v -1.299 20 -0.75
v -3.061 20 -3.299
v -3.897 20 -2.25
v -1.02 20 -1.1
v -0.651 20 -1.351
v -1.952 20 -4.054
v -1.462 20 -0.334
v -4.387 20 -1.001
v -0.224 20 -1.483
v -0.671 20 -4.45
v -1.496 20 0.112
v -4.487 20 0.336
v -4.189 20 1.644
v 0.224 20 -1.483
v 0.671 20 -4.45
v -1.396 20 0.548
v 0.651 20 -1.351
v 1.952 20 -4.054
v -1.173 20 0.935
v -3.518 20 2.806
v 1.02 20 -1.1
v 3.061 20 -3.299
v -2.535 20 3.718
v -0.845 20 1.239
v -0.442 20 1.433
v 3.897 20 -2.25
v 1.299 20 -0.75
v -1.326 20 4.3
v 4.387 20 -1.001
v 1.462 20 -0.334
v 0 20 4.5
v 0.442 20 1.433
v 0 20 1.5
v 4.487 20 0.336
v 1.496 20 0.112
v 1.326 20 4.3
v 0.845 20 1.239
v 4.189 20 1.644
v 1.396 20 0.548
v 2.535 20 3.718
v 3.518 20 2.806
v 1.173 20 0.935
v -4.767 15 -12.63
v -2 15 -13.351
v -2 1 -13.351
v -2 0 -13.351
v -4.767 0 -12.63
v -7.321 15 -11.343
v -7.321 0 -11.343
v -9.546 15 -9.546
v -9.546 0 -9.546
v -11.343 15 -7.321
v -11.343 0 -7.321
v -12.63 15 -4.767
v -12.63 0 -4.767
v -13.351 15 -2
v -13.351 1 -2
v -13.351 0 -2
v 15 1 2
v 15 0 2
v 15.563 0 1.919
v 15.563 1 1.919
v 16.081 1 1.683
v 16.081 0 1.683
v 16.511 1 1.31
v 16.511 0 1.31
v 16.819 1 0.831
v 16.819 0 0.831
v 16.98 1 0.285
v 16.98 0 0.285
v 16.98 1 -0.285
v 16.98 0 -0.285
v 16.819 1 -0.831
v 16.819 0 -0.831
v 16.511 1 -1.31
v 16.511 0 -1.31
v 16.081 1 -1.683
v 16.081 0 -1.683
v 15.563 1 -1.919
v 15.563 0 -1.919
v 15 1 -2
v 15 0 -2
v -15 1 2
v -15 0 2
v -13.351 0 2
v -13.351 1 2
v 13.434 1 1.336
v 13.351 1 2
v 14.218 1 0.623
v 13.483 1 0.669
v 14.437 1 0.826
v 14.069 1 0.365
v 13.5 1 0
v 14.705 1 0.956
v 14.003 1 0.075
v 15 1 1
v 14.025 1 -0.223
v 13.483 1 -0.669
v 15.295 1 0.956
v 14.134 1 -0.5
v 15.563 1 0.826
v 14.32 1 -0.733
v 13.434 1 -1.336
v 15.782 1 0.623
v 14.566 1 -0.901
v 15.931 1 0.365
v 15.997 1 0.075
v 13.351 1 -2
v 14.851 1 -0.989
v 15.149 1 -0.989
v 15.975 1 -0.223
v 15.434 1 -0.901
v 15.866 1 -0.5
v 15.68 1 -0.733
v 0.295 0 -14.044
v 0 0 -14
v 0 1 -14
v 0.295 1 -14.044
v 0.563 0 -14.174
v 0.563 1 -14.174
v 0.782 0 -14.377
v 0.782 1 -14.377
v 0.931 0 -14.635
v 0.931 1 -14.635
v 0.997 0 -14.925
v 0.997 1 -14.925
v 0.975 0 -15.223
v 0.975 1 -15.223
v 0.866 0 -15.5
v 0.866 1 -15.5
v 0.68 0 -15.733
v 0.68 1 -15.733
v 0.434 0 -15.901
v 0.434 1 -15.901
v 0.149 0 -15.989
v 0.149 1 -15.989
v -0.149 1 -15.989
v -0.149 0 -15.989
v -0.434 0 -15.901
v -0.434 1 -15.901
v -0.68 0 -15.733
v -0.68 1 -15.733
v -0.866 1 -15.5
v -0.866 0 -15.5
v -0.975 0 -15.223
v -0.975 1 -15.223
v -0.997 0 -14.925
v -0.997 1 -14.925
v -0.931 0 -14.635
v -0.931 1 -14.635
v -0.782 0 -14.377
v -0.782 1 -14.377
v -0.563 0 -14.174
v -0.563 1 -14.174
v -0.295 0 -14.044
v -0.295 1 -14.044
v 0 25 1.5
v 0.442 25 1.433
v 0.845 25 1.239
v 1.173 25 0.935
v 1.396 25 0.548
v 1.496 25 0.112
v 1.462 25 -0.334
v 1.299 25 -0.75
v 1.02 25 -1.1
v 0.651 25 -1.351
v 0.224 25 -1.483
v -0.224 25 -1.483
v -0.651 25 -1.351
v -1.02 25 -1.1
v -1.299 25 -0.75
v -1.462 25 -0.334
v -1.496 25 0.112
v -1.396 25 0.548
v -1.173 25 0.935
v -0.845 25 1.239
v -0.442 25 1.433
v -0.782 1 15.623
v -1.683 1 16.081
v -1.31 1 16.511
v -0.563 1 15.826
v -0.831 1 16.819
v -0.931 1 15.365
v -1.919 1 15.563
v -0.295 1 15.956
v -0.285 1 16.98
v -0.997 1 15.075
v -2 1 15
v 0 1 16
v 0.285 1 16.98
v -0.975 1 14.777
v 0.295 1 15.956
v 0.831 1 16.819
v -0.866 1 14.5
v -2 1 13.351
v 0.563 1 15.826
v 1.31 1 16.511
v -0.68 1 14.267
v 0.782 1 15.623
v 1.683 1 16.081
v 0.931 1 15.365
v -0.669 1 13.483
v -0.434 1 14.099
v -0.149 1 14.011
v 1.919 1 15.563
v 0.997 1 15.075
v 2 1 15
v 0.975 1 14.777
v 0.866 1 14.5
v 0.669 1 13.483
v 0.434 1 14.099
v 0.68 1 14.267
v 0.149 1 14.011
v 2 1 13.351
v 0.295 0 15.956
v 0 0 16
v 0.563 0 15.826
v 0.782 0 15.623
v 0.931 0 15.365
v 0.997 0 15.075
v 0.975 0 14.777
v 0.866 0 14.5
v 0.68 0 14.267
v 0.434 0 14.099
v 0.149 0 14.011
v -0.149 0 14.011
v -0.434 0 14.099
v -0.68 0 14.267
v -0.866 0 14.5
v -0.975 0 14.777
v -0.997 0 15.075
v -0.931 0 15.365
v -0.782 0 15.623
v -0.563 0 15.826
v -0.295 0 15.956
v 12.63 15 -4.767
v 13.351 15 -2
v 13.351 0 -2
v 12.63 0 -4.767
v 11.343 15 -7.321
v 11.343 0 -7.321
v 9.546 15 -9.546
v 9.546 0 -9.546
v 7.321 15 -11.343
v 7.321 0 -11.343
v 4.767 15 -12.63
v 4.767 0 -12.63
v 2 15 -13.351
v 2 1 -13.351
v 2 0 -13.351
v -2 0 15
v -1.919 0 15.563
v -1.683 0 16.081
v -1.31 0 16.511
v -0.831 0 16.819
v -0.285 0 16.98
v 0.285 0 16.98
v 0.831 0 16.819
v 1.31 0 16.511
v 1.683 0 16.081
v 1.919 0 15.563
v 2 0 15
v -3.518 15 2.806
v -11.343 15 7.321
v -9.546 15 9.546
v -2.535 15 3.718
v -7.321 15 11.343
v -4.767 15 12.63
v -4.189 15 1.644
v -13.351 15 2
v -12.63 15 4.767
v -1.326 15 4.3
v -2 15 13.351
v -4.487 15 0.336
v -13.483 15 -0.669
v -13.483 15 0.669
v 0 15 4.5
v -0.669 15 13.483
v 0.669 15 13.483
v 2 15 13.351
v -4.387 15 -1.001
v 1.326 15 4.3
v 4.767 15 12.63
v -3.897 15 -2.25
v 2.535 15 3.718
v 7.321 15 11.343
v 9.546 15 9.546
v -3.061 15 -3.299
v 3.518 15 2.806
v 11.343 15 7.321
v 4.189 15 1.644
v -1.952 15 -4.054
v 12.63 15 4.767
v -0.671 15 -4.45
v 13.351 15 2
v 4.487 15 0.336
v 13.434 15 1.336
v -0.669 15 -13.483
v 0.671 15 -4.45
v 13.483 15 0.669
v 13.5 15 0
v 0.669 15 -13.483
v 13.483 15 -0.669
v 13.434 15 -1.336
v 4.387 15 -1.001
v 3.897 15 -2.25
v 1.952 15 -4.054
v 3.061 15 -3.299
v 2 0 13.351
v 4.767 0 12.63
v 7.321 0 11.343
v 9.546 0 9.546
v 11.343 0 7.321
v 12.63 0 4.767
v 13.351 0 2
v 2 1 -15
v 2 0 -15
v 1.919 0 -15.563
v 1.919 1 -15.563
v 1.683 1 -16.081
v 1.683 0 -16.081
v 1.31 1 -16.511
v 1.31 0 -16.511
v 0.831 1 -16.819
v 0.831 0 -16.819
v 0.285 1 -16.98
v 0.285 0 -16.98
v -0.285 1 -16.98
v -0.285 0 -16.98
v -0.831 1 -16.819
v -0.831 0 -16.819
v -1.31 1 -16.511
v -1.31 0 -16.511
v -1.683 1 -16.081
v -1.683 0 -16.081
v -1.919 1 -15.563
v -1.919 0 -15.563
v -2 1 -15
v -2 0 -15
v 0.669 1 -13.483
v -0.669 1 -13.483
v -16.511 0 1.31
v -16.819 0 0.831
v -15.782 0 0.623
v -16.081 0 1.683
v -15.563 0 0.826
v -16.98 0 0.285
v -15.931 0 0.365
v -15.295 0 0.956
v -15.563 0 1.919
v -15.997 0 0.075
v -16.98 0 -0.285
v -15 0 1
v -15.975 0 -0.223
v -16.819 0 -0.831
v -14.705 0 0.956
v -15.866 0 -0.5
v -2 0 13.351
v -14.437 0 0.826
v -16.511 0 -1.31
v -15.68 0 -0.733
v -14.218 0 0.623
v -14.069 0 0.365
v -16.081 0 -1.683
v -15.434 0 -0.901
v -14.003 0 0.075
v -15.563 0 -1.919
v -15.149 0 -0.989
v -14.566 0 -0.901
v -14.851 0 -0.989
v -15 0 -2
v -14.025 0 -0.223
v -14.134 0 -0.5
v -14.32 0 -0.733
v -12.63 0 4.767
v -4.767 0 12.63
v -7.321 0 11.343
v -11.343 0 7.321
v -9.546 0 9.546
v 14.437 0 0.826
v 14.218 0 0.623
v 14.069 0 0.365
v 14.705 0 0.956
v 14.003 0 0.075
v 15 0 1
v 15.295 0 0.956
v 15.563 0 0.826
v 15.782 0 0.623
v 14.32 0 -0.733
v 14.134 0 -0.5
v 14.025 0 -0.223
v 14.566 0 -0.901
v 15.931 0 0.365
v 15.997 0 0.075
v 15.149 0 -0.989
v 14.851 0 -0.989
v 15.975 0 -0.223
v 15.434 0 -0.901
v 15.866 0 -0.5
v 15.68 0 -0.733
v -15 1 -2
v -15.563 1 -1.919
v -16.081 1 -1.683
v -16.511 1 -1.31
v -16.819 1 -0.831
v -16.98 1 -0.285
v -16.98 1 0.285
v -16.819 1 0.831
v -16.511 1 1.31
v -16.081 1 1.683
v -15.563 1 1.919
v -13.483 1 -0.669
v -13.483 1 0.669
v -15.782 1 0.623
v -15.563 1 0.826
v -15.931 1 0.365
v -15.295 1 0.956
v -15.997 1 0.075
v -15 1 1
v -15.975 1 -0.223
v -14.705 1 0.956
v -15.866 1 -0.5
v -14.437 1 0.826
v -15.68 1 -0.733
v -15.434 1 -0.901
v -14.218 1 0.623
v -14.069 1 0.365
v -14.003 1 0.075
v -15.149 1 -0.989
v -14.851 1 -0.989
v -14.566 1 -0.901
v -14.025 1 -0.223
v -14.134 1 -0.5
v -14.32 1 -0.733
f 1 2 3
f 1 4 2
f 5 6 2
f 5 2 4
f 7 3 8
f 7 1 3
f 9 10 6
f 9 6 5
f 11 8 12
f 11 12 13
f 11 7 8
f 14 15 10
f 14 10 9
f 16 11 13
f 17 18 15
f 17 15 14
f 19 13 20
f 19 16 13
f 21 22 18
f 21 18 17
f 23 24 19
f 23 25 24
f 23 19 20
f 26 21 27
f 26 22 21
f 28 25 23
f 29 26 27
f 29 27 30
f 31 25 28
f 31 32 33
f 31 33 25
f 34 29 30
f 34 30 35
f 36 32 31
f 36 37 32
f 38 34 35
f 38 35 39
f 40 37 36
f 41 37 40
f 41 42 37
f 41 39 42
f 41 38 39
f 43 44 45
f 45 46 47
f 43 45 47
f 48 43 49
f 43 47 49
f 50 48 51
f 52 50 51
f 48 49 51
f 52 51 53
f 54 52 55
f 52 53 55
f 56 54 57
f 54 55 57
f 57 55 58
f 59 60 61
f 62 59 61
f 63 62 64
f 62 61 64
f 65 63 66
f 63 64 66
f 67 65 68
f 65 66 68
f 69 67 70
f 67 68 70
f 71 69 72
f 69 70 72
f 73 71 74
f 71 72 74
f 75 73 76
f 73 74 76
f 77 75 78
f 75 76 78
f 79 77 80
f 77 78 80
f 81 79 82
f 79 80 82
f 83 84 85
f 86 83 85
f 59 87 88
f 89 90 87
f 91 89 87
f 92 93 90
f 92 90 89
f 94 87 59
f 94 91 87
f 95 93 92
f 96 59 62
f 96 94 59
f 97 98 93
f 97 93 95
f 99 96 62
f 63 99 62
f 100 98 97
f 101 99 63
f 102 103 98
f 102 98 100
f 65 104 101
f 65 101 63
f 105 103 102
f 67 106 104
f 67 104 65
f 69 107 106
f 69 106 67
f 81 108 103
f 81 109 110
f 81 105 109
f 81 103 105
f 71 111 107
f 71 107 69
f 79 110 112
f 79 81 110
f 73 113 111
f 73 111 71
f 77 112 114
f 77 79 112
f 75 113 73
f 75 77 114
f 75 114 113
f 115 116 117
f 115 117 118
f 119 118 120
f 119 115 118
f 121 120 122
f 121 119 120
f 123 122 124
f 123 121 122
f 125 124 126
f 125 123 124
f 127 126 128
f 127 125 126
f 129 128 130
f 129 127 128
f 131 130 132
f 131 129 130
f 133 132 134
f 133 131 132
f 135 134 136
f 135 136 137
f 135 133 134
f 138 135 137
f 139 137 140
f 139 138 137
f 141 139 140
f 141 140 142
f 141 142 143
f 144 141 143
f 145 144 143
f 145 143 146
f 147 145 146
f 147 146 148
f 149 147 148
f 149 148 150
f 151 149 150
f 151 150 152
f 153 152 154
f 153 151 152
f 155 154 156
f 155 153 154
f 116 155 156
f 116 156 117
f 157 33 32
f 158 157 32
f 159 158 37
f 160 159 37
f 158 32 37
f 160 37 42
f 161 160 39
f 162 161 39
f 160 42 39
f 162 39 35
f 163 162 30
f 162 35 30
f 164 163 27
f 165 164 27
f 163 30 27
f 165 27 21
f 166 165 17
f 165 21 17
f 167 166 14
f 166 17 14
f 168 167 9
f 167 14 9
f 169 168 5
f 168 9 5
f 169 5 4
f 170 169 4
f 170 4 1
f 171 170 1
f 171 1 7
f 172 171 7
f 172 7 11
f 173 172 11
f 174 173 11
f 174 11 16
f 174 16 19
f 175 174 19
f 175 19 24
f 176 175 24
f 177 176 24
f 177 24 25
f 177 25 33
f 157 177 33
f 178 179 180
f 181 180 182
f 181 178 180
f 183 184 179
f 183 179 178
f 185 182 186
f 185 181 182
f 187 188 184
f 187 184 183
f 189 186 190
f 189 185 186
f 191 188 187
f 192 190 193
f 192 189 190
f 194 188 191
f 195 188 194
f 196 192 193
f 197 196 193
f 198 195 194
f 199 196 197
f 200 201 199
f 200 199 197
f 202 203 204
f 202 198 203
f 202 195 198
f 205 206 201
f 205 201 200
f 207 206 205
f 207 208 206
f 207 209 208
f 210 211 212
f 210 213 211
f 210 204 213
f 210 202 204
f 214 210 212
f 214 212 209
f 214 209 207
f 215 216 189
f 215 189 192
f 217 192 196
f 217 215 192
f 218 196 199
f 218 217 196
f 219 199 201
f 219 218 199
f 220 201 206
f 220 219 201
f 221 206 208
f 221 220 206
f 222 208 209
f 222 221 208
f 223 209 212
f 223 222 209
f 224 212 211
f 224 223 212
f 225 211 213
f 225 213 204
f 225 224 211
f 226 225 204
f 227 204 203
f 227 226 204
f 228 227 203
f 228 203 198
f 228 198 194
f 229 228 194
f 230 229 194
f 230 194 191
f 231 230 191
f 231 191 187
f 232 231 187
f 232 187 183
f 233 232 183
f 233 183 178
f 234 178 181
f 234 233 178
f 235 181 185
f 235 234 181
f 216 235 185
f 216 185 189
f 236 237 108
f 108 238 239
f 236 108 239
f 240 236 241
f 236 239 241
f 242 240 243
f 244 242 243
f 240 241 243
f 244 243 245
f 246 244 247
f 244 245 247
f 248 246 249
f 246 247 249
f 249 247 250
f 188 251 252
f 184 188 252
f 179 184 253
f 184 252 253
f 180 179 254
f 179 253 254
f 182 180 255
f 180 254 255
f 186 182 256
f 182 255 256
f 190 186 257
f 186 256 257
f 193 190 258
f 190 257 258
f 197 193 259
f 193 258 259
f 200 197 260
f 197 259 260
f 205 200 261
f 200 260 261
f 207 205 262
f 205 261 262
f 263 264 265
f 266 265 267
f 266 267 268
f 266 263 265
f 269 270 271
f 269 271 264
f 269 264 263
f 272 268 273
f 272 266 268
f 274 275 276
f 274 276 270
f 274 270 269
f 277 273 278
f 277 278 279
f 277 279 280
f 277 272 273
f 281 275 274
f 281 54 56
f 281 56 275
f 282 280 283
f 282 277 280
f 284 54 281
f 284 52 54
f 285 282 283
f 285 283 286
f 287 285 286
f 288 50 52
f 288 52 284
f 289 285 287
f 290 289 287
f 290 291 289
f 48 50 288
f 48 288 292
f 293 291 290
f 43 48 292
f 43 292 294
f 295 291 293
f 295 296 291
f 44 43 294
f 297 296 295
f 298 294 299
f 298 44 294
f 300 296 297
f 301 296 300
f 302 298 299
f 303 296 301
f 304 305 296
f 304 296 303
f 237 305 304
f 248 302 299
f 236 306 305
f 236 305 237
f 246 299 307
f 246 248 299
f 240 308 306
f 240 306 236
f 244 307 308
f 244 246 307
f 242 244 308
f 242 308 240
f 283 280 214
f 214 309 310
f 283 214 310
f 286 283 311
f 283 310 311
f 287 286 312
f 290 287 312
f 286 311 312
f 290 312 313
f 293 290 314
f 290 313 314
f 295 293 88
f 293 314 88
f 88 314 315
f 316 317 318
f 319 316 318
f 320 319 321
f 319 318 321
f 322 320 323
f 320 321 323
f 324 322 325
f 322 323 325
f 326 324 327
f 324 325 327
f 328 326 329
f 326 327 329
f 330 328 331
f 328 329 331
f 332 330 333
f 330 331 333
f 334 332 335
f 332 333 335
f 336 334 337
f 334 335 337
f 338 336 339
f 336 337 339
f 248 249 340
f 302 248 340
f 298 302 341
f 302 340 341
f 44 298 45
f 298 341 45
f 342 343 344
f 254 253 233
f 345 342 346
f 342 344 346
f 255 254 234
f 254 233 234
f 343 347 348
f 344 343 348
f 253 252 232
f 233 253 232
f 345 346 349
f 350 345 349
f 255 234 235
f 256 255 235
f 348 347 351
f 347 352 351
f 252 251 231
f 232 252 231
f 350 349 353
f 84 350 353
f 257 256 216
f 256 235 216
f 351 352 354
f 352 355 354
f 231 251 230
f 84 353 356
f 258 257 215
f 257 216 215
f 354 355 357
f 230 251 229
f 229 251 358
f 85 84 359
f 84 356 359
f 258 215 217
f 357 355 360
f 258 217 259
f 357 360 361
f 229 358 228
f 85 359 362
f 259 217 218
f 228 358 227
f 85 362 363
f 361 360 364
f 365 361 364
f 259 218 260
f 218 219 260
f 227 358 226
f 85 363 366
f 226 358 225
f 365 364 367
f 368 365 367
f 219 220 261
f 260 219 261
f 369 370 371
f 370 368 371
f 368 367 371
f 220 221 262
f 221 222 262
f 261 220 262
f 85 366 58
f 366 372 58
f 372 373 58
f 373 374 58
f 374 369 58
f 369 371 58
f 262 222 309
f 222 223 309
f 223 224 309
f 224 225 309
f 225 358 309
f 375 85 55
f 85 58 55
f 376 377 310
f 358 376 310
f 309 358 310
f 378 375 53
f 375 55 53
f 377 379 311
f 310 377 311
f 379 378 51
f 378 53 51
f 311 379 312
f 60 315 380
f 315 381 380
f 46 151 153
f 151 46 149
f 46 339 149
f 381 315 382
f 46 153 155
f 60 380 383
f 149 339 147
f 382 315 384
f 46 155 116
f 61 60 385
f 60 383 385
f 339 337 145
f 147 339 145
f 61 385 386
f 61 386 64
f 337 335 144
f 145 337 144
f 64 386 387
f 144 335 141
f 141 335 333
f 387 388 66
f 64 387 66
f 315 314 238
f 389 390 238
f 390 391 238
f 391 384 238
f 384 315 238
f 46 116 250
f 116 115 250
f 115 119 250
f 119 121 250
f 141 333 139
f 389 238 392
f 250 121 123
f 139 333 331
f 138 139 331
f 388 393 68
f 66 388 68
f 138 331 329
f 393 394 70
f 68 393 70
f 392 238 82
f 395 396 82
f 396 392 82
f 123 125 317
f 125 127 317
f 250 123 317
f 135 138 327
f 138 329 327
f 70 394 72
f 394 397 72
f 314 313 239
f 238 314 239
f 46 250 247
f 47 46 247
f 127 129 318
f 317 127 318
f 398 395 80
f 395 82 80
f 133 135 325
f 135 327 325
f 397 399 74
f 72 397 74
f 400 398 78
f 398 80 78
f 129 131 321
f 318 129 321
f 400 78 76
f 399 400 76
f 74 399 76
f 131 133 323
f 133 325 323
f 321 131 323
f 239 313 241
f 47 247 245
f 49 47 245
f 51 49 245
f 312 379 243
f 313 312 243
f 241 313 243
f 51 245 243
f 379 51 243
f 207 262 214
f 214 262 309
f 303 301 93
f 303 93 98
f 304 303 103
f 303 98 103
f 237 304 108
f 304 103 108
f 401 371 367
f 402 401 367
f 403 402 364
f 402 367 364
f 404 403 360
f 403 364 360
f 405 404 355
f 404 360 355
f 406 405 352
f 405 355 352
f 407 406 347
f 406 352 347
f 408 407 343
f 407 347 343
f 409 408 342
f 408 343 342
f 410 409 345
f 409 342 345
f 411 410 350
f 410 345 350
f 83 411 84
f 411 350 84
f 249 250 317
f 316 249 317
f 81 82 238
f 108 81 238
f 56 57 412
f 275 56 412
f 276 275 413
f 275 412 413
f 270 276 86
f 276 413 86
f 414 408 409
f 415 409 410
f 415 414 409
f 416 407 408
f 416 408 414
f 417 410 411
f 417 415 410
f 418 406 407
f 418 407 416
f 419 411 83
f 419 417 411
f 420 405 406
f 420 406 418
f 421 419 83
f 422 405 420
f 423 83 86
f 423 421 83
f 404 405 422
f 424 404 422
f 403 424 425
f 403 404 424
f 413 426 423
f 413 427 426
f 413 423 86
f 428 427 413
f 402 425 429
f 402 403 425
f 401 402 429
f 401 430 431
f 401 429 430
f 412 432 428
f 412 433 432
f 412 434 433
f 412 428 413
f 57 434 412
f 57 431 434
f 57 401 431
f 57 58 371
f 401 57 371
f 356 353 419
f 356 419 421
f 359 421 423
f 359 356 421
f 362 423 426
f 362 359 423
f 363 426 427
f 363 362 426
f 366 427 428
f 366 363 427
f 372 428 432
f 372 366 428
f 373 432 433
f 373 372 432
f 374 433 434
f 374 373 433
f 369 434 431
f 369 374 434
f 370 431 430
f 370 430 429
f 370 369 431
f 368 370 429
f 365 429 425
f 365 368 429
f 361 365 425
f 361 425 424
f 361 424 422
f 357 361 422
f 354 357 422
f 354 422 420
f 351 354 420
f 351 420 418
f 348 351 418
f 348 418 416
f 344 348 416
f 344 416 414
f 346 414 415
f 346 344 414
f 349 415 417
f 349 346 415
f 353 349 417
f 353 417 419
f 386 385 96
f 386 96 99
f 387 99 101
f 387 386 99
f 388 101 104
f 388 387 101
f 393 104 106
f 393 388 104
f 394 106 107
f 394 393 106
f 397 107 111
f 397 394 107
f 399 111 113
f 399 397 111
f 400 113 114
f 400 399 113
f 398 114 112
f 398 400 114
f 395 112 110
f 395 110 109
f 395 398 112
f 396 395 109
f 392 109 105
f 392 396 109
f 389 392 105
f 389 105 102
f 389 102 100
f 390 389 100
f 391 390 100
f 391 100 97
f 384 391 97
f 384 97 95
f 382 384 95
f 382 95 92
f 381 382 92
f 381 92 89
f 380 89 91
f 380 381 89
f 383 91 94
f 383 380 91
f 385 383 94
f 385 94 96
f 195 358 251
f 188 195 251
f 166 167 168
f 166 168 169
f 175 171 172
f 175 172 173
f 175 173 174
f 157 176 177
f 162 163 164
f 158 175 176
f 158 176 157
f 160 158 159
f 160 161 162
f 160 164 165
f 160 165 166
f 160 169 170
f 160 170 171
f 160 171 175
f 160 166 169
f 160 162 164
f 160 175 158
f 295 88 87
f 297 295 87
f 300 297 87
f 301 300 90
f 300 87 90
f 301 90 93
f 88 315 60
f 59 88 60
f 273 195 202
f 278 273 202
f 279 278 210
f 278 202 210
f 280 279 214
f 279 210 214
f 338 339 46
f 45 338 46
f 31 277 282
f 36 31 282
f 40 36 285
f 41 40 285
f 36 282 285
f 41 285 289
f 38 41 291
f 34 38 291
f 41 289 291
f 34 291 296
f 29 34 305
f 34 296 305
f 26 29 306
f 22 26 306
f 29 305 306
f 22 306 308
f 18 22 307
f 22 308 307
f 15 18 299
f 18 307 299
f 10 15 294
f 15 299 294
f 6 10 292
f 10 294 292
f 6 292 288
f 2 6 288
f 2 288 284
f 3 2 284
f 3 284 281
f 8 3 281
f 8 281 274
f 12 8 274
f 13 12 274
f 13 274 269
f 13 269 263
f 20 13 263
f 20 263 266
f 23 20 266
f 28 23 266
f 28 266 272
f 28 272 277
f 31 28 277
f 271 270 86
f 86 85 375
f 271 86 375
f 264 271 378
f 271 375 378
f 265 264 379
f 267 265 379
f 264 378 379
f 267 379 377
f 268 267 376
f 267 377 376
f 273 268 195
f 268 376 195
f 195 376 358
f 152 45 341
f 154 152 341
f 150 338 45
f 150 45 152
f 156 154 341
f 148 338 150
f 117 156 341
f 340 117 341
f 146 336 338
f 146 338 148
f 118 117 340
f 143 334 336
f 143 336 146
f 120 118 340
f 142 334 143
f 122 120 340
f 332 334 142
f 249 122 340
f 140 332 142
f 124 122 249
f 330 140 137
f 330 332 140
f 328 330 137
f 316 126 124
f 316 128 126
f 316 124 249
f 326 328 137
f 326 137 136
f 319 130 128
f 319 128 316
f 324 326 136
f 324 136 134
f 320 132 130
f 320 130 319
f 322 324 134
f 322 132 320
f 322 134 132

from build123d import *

# Parameters (mm, degrees)
SKETCH1_R           = 1.5
BOSS_EXTRUDE6_DEPTH = 25
SKETCH1_9_R         = 4.5
SKETCH1_9_R_2       = 1.5
BOSS_EXTRUDE7_DEPTH = 20
SKETCH1_10_R        = 13.5
SKETCH1_10_R_2      = 4.5
BOSS_EXTRUDE8_DEPTH = 15
SKETCH1_12_R        = 1
BOSS_EXTRUDE9_DEPTH = 1


with BuildPart() as part:
    # Sketch1 → Boss-Extrude6 (new body)
    with BuildSketch(Plane(origin=(0, 0, 0), x_dir=(1, 0, 0), z_dir=(0, 1, 0))):
        Circle(SKETCH1_R)
    extrude(amount=BOSS_EXTRUDE6_DEPTH)

    # Sketch1<9> → Boss-Extrude7 (add)
    with BuildSketch(Plane(origin=(0, 0, 0), x_dir=(1, 0, 0), z_dir=(0, 1, 0))):
        Circle(SKETCH1_9_R)
        Circle(SKETCH1_9_R_2, mode=Mode.SUBTRACT)
    extrude(amount=BOSS_EXTRUDE7_DEPTH)

    # Sketch1<10> → Boss-Extrude8 (add)
    with BuildSketch(Plane(origin=(0, 0, 0), x_dir=(1, 0, 0), z_dir=(0, 1, 0))):
        Circle(SKETCH1_10_R)
        Circle(SKETCH1_10_R_2, mode=Mode.SUBTRACT)
    extrude(amount=BOSS_EXTRUDE8_DEPTH)

    # Sketch1<12> → Boss-Extrude9 (add)
    # profile 1 of 4: a face of its own
    with BuildSketch(Plane(origin=(0, 0, 0), x_dir=(1, 0, 0), z_dir=(0, 1, 0))):
        with BuildLine():
            Line((2, 13.351029923), (2, 15))
            ThreePointArc((2, 15), (0, 17), (-2, 15))
            Line((-2, 15), (-2, 13.351029923))
            ThreePointArc((-2, 13.351029923), (0, 13.5), (2, 13.351029923))
        make_face()
        with Locations((0, 15)):
            Circle(SKETCH1_12_R, mode=Mode.SUBTRACT)
    # profile 2 of 4: a face of its own
    with BuildSketch(Plane(origin=(0, 0, 0), x_dir=(1, 0, 0), z_dir=(0, 1, 0))):
        with BuildLine():
            Line((15, 2), (13.351029923, 2))
            ThreePointArc((13.351029923, 2), (13.5, 0), (13.351029923, -2))
            Line((13.351029923, -2), (15, -2))
            ThreePointArc((15, -2), (17, 0), (15, 2))
        make_face()
        with Locations((15, 0)):
            Circle(SKETCH1_12_R, mode=Mode.SUBTRACT)
    # profile 3 of 4: a face of its own
    with BuildSketch(Plane(origin=(0, 0, 0), x_dir=(1, 0, 0), z_dir=(0, 1, 0))):
        with BuildLine():
            ThreePointArc((-13.351029923, -2), (-13.5, 0), (-13.351029923, 2))
            Line((-13.351029923, 2), (-15, 2))
            ThreePointArc((-15, 2), (-17, 0), (-15, -2))
            Line((-15, -2), (-13.351029923, -2))
        make_face()
        with Locations((-15, 0)):
            Circle(SKETCH1_12_R, mode=Mode.SUBTRACT)
    # profile 4 of 4: a face of its own
    with BuildSketch(Plane(origin=(0, 0, 0), x_dir=(1, 0, 0), z_dir=(0, 1, 0))):
        with BuildLine():
            Line((2, -15), (2, -13.351029923))
            ThreePointArc((2, -13.351029923), (0, -13.5), (-2, -13.351029923))
            Line((-2, -13.351029923), (-2, -15))
            ThreePointArc((-2, -15), (0, -17), (2, -15))
        make_face()
        with Locations((0, -15)):
            Circle(SKETCH1_12_R, mode=Mode.SUBTRACT)
    extrude(amount=BOSS_EXTRUDE9_DEPTH)


solid = part.part
